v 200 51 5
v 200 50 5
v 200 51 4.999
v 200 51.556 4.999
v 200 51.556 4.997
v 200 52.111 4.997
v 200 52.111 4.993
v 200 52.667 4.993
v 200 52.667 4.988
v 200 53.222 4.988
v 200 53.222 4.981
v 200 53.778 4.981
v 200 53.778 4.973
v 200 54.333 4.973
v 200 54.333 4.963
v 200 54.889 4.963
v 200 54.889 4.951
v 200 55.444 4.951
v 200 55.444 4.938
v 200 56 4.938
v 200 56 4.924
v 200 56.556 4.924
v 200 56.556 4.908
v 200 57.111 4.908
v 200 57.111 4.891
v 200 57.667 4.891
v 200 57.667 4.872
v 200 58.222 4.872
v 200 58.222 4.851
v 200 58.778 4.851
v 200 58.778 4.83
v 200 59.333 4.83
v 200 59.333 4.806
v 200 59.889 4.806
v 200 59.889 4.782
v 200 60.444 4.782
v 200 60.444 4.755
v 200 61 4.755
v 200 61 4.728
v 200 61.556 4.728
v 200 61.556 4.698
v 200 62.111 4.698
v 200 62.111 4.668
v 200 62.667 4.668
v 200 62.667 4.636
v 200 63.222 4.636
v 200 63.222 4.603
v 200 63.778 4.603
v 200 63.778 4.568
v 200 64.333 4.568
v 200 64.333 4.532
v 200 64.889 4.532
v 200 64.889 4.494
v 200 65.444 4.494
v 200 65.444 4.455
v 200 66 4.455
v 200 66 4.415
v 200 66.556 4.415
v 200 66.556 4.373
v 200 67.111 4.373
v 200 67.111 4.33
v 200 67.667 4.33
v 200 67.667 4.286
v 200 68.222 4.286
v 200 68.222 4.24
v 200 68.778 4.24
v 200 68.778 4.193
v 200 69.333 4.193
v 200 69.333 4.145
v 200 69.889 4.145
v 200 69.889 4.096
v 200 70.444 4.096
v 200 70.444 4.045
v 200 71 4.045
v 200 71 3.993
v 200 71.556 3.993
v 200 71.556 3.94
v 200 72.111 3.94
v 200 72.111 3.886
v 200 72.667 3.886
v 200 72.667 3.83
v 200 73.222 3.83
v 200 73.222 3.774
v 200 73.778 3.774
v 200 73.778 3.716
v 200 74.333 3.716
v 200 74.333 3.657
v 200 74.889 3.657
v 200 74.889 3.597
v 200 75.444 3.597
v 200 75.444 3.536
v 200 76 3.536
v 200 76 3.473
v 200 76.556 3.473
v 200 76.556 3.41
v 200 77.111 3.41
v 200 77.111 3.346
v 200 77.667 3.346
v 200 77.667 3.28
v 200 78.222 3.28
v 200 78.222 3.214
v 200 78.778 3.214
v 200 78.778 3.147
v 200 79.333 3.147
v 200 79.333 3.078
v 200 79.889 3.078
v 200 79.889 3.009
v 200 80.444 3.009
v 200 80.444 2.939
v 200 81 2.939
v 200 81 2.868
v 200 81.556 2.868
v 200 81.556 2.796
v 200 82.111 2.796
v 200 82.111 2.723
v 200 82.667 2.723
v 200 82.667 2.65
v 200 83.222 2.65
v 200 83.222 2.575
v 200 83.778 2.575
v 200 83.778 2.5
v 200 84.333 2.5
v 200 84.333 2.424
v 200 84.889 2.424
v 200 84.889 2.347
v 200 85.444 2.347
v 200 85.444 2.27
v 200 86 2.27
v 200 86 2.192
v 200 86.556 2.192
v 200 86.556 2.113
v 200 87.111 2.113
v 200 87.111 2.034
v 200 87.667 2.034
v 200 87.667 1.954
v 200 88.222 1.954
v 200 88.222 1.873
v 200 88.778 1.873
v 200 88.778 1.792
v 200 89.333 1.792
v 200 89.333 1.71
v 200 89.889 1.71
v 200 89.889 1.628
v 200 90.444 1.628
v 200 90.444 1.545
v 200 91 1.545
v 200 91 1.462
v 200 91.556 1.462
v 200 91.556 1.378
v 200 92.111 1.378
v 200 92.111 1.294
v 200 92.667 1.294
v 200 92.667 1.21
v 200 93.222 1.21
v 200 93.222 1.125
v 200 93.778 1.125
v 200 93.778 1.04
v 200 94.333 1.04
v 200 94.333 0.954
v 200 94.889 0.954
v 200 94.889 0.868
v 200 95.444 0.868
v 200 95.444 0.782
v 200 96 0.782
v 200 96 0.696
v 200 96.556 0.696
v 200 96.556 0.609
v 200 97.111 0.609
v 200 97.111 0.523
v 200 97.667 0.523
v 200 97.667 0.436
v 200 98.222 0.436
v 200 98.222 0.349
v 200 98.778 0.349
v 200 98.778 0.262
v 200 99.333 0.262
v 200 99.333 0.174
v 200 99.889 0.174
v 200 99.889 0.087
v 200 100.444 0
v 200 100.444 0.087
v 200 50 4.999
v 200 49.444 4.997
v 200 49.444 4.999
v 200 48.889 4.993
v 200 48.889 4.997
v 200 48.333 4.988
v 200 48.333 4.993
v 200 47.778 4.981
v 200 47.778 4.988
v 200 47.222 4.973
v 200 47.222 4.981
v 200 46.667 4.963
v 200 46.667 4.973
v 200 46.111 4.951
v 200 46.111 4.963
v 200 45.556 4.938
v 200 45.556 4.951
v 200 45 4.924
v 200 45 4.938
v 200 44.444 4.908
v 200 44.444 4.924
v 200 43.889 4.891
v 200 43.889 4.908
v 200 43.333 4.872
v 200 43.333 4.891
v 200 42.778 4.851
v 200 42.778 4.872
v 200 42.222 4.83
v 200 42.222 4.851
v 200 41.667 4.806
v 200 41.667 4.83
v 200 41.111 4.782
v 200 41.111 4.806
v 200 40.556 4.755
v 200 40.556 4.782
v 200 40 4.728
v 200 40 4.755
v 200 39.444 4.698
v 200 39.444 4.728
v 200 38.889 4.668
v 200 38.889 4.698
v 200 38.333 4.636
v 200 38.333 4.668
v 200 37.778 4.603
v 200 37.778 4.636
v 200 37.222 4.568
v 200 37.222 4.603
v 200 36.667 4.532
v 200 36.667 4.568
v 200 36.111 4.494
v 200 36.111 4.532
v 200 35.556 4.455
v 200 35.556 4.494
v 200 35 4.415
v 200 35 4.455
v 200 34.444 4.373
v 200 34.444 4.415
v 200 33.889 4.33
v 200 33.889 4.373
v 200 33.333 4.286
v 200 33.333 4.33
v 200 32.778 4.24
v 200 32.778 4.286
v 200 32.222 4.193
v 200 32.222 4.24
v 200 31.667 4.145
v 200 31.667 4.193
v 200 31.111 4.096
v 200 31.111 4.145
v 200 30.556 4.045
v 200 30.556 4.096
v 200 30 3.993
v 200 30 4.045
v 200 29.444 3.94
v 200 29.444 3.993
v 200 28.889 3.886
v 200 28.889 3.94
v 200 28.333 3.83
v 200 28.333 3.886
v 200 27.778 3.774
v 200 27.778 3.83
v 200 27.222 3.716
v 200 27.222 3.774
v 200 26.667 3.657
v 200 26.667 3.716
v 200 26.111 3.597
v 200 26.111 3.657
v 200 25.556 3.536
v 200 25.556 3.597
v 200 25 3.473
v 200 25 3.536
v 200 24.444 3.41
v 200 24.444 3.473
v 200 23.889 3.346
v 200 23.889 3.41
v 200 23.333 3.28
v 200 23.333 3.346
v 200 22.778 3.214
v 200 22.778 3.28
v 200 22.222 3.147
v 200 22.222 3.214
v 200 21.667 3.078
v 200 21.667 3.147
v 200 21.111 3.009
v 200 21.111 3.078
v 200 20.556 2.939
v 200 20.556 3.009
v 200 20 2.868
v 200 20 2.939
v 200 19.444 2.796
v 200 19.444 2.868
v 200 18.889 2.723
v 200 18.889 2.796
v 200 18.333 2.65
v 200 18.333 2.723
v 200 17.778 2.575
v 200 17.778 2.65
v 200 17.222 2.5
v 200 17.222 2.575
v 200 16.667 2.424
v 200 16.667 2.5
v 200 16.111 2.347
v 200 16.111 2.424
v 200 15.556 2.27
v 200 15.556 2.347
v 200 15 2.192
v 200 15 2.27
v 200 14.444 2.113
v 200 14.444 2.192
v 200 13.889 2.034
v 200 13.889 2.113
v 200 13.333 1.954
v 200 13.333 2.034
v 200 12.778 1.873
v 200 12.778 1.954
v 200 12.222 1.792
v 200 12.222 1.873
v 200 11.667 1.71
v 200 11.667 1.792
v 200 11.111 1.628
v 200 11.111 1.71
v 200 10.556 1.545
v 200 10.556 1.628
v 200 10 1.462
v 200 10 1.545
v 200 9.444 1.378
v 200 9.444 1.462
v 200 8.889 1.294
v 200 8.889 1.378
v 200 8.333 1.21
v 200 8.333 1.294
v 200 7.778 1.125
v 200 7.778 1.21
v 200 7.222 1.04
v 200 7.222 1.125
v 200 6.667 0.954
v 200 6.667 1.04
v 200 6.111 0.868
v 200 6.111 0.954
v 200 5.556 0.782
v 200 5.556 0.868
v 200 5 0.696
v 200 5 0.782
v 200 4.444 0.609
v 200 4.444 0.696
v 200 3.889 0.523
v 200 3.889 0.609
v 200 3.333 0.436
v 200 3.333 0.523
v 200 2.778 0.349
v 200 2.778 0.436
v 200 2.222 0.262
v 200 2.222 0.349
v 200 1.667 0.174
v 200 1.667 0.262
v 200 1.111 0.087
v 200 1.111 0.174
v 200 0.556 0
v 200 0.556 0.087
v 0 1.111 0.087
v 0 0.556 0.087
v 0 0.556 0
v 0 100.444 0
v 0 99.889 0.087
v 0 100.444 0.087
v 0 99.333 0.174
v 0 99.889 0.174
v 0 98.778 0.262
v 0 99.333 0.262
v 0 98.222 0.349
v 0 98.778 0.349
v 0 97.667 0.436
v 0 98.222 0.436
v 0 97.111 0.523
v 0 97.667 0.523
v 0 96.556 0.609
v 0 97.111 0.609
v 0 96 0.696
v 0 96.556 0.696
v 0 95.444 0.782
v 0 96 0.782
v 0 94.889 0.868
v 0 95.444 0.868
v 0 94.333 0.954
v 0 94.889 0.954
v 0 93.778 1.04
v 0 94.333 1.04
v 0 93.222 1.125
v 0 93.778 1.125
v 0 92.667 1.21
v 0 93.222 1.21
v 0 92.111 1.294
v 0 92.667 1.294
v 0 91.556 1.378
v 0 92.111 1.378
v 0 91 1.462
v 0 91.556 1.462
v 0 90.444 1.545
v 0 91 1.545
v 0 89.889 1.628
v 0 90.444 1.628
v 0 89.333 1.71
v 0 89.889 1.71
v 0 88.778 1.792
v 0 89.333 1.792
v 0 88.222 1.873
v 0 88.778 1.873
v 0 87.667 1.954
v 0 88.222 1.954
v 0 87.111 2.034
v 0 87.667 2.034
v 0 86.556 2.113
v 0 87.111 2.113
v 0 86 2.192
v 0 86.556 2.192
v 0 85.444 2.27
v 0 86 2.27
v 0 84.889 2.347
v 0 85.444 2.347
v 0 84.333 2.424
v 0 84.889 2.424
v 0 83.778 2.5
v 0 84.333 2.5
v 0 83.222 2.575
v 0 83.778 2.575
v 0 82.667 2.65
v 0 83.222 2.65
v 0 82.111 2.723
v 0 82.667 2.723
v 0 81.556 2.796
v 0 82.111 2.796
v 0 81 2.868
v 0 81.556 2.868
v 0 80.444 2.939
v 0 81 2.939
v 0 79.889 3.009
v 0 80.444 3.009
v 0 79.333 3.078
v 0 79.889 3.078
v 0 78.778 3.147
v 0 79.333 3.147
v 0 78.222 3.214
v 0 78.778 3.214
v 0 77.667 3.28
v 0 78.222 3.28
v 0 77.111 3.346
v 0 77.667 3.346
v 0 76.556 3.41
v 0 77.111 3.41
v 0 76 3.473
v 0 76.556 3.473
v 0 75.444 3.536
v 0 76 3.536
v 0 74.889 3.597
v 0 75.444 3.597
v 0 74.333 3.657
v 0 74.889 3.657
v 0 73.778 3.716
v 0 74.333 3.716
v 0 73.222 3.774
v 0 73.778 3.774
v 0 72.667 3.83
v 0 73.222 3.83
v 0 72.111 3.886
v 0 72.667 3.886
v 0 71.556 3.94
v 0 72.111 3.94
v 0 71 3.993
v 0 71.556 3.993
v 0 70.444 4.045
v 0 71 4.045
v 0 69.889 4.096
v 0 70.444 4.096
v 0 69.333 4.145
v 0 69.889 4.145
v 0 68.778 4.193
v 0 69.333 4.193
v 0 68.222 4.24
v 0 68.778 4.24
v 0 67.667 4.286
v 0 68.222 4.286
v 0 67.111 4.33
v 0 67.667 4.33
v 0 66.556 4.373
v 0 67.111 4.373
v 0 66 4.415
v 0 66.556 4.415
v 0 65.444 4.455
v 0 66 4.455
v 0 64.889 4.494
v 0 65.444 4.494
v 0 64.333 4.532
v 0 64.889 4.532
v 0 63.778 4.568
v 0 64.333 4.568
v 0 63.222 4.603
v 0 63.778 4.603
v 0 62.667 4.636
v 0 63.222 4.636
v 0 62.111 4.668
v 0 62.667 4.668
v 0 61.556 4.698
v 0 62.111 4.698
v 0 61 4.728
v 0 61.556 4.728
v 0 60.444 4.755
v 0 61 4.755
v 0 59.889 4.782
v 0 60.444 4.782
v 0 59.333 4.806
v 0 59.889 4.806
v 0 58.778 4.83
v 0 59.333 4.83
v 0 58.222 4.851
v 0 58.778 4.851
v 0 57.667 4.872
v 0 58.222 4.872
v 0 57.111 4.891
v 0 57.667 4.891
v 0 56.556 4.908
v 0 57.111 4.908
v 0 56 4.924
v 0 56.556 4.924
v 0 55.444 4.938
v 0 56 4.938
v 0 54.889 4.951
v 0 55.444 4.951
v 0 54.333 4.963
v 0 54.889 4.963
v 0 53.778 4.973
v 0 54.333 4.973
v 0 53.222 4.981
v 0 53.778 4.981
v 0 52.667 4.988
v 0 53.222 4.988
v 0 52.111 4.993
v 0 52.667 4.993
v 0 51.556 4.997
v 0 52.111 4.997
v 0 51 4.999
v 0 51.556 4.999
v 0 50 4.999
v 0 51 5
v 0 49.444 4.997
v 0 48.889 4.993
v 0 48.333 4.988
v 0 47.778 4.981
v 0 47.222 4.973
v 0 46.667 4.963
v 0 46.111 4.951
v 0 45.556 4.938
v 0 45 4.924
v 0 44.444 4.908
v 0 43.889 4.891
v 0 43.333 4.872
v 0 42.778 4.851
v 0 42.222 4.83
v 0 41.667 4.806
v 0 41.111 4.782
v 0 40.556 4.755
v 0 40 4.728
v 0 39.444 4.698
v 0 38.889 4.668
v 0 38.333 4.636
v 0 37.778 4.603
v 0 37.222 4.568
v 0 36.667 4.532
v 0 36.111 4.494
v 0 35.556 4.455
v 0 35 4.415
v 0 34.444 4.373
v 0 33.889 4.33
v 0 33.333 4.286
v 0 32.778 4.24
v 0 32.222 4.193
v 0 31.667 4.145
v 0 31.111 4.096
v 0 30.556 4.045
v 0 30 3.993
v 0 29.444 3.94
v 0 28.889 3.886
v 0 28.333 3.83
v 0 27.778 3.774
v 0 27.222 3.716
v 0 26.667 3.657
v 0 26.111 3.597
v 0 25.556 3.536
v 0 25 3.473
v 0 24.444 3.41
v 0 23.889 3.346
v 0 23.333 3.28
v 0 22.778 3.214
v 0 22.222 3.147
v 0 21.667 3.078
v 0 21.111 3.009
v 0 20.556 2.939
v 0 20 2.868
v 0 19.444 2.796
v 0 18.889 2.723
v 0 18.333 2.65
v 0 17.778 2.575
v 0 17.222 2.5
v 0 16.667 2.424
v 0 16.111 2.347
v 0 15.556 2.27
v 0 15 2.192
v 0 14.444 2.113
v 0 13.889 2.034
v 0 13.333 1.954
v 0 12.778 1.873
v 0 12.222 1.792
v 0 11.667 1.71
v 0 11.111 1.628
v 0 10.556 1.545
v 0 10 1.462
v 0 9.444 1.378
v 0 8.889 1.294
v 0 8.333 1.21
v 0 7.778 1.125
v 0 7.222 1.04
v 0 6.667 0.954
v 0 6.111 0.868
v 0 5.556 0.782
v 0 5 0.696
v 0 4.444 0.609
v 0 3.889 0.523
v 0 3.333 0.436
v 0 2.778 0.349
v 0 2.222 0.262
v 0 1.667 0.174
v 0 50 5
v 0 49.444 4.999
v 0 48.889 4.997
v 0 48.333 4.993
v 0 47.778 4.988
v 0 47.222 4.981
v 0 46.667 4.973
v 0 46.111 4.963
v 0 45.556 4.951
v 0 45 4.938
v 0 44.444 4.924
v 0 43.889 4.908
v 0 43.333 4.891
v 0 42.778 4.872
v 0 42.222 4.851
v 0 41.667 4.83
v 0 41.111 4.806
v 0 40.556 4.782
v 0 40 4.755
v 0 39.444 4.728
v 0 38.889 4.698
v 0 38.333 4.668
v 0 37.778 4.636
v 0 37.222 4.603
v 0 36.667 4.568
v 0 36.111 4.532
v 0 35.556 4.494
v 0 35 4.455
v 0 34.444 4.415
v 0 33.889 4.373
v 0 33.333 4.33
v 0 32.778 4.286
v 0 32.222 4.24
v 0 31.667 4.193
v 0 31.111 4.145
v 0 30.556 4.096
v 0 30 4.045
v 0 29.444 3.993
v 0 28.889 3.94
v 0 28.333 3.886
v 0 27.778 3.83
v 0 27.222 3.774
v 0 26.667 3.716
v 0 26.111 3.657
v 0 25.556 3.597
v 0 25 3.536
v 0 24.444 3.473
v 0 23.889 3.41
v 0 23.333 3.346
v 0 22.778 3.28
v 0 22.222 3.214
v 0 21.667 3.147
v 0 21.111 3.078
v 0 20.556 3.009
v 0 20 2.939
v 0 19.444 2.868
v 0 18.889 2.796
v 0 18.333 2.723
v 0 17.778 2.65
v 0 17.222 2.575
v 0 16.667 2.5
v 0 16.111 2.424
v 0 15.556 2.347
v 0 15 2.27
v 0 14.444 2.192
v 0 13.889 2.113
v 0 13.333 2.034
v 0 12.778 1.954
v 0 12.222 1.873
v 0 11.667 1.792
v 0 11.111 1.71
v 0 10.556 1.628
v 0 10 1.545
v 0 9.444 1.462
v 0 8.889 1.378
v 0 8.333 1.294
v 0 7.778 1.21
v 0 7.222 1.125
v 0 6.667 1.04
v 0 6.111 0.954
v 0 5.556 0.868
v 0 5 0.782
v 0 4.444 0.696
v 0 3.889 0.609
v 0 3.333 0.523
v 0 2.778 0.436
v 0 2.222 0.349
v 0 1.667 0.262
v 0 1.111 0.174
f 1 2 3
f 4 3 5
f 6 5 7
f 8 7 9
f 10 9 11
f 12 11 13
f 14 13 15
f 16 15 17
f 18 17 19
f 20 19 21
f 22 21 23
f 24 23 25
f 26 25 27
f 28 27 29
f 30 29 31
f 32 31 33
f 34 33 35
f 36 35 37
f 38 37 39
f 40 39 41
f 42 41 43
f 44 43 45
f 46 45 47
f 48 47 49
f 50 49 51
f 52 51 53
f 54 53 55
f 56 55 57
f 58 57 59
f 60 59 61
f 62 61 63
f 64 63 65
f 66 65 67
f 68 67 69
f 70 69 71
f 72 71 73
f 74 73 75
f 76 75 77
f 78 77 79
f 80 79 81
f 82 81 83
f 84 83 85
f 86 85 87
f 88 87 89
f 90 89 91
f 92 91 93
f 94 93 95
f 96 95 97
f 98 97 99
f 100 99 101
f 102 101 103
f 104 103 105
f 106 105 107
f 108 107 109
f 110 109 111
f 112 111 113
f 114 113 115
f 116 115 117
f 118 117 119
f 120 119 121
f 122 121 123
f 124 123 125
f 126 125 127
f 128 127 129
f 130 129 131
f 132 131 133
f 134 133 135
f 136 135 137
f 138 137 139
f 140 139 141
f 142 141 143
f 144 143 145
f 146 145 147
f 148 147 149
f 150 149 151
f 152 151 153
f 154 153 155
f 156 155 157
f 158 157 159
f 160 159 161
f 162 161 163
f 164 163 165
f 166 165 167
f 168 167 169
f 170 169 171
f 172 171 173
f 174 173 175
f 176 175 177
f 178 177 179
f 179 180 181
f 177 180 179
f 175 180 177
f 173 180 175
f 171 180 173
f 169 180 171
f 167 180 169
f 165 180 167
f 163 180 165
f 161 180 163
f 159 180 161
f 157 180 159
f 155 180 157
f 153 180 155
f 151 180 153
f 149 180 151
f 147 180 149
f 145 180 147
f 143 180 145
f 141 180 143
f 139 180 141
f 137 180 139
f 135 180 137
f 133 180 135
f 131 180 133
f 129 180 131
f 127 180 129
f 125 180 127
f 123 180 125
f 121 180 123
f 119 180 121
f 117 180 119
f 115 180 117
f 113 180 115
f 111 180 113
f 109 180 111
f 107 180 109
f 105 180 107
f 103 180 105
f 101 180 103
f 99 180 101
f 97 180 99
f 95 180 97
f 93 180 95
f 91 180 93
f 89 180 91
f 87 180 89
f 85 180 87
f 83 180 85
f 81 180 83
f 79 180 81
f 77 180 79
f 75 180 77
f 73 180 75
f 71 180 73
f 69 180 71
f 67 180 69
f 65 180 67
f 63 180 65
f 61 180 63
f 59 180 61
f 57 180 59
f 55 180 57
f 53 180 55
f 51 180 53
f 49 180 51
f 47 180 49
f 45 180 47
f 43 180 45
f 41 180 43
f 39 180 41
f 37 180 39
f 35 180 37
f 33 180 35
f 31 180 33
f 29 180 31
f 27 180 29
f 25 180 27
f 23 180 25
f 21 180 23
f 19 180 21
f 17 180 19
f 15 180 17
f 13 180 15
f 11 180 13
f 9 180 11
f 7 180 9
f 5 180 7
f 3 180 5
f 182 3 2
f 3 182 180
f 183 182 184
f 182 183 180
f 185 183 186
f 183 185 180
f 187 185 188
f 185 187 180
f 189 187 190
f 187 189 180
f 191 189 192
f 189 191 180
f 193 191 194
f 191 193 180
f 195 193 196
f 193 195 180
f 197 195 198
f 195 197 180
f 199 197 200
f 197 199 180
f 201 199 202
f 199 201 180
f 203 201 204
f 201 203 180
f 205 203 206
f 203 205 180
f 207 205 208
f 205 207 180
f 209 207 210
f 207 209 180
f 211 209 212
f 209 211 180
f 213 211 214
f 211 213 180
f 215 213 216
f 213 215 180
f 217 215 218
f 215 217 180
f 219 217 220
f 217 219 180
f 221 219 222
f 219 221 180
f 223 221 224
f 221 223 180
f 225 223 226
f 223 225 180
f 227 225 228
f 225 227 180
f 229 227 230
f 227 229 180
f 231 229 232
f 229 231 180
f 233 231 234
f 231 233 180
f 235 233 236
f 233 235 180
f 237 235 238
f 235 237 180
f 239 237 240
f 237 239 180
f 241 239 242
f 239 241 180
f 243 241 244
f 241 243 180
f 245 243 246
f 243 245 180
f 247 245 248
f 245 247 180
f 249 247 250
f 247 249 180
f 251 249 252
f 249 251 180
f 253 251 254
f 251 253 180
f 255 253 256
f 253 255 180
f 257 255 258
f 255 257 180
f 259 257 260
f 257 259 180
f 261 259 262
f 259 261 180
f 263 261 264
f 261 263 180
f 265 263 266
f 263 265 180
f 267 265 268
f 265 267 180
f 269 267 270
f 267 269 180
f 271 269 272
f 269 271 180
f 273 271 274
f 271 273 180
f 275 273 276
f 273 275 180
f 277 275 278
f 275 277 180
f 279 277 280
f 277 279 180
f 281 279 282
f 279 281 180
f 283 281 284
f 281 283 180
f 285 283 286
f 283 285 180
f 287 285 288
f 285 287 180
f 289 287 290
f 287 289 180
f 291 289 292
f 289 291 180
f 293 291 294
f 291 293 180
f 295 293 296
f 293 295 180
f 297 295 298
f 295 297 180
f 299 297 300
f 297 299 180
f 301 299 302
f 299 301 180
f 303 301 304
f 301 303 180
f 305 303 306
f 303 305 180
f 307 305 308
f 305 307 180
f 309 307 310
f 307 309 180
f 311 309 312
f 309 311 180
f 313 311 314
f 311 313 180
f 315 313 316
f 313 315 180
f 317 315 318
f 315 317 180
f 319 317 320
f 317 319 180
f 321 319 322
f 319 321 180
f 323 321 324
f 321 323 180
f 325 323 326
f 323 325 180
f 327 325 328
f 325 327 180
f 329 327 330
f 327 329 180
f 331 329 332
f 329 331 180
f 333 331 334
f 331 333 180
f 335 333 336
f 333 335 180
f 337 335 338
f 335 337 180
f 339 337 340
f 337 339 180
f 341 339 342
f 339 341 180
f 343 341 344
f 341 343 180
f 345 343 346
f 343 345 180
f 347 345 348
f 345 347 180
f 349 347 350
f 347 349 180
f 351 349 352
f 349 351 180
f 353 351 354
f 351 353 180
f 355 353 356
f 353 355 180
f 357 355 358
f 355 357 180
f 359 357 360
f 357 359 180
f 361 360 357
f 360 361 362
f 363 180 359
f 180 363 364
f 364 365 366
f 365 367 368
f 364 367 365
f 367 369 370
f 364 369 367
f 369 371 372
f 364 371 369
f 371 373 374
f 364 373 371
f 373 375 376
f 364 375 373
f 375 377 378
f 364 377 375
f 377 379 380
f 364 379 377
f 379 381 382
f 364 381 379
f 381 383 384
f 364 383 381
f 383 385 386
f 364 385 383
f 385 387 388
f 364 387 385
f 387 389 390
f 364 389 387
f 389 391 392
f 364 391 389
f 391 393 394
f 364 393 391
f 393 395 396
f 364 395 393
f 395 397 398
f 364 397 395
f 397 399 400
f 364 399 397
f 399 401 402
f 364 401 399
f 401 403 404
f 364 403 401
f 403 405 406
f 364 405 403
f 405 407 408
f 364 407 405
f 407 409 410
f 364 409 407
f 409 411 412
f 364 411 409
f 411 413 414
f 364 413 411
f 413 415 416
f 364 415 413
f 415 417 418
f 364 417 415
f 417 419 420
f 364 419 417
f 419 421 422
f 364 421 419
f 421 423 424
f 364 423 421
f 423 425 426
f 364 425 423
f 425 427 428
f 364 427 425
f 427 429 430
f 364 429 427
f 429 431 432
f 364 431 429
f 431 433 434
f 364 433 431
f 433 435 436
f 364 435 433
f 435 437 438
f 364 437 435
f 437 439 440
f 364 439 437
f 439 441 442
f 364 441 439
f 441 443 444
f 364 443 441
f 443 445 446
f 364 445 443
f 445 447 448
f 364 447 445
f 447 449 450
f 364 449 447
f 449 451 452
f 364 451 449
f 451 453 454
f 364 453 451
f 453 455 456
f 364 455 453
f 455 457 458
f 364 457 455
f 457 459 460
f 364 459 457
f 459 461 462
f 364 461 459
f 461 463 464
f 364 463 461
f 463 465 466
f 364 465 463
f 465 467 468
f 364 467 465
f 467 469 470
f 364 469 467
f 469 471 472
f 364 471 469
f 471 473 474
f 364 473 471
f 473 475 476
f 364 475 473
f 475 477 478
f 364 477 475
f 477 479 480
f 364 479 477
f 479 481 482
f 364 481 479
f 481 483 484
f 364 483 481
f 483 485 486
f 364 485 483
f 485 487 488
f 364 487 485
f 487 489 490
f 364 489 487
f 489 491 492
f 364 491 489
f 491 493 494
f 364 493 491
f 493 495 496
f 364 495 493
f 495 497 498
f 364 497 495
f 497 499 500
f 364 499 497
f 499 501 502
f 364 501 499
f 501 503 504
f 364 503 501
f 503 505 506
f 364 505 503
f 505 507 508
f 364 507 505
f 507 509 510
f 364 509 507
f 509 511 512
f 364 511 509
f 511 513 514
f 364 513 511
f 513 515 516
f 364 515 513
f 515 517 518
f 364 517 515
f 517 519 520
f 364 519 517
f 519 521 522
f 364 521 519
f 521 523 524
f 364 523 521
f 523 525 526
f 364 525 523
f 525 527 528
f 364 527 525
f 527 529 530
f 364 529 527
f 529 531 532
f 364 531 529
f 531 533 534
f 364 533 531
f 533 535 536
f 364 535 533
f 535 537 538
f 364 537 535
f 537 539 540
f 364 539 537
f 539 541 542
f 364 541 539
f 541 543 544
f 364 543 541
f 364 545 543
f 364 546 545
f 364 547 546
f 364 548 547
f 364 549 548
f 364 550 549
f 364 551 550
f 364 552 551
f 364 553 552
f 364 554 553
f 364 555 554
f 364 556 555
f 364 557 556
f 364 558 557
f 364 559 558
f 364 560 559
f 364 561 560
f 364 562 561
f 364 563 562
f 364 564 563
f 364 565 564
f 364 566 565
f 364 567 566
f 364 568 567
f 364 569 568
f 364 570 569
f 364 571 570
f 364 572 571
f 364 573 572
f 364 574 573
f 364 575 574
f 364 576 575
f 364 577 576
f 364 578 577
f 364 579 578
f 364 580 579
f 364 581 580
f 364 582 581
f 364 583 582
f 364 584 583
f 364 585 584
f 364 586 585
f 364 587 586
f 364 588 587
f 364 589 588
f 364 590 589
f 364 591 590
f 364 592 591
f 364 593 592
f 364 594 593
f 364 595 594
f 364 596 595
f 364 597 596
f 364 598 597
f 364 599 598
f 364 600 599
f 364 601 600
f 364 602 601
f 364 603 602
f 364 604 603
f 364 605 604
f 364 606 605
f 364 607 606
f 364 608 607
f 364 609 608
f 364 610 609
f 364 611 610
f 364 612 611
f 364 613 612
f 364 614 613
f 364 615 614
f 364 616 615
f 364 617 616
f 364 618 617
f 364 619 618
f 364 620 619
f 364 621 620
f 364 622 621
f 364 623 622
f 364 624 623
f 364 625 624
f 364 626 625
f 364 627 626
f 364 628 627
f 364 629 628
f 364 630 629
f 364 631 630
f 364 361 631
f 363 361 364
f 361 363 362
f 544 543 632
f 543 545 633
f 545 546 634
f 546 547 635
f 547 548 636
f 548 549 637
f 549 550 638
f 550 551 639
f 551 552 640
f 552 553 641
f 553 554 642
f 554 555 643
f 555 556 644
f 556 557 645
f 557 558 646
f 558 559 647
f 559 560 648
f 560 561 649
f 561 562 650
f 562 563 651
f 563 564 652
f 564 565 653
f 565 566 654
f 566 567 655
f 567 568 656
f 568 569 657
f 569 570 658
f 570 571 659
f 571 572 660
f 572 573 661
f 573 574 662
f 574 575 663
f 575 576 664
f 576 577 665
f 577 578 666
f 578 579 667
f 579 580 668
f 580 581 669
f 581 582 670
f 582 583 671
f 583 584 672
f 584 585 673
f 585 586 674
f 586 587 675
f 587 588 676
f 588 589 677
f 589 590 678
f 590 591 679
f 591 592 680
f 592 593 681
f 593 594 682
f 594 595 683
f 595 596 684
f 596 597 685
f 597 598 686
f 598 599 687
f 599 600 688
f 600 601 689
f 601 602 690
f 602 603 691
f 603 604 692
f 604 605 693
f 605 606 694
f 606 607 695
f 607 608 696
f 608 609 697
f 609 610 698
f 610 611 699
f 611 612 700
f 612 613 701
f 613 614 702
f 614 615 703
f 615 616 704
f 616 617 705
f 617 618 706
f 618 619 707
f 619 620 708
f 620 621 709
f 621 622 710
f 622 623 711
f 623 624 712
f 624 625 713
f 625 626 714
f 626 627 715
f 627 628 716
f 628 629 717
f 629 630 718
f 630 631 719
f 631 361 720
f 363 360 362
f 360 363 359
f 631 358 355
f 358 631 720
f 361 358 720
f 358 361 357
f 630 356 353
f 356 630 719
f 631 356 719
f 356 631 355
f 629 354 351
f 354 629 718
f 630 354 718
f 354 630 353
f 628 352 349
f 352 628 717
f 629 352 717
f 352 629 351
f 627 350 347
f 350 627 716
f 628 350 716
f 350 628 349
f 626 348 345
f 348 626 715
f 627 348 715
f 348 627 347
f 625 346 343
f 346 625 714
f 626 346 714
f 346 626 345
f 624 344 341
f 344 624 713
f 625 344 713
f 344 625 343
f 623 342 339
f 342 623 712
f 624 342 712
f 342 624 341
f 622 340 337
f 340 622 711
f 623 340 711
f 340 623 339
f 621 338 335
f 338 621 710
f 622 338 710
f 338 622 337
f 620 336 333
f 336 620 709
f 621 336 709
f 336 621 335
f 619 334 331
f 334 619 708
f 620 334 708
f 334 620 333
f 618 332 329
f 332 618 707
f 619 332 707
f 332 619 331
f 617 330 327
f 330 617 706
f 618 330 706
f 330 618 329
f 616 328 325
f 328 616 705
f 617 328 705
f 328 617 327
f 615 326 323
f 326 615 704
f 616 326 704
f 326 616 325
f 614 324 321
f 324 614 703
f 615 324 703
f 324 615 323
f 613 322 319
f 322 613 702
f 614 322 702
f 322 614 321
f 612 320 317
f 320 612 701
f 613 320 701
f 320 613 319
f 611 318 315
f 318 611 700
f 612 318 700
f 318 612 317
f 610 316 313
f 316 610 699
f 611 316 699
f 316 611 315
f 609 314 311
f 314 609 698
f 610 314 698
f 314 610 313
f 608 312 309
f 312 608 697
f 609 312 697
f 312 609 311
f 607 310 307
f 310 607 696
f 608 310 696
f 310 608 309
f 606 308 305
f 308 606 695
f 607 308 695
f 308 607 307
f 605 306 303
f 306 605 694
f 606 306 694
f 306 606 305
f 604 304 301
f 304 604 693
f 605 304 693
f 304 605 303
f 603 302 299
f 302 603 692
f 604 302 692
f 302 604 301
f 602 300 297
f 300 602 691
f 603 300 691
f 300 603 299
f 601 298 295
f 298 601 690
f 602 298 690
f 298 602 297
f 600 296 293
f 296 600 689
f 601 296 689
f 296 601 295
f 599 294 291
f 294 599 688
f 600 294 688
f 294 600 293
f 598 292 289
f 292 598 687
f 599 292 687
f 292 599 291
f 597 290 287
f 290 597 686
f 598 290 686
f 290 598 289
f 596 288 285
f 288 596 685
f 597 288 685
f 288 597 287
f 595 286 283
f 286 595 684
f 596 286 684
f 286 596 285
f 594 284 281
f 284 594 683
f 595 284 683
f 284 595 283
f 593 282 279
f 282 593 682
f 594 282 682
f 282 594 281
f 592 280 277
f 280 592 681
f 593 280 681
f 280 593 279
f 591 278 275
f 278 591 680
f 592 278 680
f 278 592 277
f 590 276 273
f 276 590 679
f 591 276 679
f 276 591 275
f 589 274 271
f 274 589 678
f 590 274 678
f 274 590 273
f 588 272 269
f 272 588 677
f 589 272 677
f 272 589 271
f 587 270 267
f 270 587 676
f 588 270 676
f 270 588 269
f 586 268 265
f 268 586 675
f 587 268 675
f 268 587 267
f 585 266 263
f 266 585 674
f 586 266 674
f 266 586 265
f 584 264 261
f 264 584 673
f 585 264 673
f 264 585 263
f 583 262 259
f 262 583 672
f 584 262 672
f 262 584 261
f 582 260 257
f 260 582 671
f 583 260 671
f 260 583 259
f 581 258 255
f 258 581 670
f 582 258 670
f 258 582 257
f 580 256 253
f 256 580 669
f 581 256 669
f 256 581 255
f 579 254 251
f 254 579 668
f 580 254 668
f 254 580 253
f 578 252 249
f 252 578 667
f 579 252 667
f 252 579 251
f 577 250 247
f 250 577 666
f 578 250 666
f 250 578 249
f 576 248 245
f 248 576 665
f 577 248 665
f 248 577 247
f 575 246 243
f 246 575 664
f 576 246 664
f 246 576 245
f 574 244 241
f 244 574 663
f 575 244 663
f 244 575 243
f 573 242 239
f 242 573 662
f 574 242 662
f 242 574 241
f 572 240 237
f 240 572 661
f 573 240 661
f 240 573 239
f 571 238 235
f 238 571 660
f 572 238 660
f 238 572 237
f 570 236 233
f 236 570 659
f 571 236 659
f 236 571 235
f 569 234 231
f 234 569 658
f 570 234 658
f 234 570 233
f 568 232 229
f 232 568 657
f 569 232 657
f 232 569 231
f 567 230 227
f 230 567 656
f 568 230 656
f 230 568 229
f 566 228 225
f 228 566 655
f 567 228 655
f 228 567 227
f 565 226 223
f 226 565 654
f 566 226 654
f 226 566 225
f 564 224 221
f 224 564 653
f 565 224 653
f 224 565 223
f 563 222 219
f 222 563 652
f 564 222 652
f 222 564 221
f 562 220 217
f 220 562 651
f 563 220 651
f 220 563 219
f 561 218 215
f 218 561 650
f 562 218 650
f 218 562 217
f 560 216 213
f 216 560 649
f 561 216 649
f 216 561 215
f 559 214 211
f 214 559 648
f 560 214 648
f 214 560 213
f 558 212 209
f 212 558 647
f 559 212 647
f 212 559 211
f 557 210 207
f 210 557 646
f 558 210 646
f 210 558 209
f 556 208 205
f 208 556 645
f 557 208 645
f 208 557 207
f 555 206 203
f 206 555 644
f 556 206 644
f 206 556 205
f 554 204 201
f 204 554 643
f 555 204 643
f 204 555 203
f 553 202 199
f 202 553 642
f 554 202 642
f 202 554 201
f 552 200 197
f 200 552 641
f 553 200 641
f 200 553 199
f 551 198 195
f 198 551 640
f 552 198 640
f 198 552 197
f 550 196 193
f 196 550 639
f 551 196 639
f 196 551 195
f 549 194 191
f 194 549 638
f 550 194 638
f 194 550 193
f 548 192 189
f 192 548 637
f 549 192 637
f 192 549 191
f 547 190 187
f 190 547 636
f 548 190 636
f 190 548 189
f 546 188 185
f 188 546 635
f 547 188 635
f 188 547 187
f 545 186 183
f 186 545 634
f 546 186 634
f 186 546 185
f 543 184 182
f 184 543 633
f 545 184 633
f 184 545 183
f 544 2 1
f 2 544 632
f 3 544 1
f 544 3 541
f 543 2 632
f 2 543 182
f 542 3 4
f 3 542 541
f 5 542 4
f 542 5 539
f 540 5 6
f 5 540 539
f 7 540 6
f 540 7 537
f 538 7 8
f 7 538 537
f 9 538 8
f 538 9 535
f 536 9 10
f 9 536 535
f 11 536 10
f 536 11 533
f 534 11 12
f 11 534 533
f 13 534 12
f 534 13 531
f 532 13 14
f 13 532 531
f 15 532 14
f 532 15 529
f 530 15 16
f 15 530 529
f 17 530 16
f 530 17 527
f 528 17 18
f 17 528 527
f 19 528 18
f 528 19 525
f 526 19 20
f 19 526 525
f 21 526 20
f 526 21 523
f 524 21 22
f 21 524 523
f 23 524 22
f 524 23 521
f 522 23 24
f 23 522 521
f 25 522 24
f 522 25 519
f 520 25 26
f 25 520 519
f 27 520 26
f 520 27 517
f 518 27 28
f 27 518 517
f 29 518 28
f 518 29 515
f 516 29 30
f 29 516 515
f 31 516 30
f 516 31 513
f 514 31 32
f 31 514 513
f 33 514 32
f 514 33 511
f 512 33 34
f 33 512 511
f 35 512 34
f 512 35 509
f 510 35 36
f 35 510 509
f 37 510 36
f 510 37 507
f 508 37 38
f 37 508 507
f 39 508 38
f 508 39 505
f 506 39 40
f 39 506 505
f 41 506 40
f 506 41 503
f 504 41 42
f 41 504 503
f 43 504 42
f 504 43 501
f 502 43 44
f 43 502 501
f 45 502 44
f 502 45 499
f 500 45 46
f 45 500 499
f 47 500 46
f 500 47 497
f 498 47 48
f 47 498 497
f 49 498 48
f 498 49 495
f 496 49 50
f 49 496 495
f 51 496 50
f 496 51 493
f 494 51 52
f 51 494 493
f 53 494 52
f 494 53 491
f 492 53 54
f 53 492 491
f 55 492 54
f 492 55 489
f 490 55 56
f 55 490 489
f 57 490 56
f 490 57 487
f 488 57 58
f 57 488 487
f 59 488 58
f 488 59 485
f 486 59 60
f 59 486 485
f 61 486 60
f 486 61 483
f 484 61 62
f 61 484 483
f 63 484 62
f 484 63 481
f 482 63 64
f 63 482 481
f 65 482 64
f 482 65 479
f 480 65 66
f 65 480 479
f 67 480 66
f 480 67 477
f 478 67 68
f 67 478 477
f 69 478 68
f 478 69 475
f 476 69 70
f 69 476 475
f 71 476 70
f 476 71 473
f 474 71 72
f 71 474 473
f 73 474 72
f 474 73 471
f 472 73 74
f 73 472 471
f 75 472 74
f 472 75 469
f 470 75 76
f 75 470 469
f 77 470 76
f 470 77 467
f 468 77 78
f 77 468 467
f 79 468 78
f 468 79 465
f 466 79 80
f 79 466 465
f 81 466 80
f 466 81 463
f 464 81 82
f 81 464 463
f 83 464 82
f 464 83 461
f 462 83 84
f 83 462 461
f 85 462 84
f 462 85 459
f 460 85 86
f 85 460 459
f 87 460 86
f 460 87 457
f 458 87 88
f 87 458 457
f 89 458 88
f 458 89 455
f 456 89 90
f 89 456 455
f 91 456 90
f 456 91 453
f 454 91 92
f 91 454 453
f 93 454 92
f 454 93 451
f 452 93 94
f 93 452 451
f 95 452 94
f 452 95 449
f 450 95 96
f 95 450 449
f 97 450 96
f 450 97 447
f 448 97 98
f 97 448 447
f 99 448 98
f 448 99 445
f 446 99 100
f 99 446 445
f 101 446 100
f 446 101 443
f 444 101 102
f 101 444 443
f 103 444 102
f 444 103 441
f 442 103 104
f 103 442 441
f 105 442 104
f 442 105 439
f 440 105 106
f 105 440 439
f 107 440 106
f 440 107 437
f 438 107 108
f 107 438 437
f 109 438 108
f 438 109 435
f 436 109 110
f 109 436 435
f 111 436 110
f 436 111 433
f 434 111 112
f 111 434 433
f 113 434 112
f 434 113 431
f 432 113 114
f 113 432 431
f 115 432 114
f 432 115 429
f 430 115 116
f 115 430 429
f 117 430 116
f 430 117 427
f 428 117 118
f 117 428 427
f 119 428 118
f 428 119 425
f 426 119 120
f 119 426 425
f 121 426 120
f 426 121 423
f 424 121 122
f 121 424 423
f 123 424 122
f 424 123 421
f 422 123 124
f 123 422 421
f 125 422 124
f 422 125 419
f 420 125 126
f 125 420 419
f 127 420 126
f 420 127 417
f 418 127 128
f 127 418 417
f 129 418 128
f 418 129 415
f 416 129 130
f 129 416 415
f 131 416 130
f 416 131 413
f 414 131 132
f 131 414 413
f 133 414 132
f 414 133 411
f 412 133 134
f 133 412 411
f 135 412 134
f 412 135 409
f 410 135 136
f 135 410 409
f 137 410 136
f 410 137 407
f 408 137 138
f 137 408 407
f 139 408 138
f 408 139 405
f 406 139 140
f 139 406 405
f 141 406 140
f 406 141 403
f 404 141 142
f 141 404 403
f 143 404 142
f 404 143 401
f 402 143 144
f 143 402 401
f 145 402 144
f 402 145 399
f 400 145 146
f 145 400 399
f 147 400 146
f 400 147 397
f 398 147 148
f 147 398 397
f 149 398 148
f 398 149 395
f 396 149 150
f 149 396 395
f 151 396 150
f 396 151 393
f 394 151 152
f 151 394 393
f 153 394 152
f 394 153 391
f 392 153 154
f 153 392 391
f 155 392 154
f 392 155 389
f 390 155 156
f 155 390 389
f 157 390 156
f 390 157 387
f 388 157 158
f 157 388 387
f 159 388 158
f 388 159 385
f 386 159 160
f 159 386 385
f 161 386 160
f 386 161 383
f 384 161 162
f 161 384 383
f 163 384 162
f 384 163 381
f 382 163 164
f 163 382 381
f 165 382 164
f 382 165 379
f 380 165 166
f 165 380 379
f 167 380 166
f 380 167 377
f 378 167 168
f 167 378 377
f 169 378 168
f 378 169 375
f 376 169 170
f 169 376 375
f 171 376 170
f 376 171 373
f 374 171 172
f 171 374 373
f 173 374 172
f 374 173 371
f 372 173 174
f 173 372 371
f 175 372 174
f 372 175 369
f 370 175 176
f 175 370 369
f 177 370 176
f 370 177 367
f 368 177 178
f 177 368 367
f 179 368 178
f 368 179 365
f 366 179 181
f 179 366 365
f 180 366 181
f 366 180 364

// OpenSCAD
module curvedSurface (length = 10, width = 10, height = 10) {
    // todo - from min height to max height (currently just from 0 to max height
    for(i=[0:360])
        translate([0, (width / 360) * i, 0])
            cube([length, 1, sin(i) * height]);
}

curvedSurface(200, 200, 5);
